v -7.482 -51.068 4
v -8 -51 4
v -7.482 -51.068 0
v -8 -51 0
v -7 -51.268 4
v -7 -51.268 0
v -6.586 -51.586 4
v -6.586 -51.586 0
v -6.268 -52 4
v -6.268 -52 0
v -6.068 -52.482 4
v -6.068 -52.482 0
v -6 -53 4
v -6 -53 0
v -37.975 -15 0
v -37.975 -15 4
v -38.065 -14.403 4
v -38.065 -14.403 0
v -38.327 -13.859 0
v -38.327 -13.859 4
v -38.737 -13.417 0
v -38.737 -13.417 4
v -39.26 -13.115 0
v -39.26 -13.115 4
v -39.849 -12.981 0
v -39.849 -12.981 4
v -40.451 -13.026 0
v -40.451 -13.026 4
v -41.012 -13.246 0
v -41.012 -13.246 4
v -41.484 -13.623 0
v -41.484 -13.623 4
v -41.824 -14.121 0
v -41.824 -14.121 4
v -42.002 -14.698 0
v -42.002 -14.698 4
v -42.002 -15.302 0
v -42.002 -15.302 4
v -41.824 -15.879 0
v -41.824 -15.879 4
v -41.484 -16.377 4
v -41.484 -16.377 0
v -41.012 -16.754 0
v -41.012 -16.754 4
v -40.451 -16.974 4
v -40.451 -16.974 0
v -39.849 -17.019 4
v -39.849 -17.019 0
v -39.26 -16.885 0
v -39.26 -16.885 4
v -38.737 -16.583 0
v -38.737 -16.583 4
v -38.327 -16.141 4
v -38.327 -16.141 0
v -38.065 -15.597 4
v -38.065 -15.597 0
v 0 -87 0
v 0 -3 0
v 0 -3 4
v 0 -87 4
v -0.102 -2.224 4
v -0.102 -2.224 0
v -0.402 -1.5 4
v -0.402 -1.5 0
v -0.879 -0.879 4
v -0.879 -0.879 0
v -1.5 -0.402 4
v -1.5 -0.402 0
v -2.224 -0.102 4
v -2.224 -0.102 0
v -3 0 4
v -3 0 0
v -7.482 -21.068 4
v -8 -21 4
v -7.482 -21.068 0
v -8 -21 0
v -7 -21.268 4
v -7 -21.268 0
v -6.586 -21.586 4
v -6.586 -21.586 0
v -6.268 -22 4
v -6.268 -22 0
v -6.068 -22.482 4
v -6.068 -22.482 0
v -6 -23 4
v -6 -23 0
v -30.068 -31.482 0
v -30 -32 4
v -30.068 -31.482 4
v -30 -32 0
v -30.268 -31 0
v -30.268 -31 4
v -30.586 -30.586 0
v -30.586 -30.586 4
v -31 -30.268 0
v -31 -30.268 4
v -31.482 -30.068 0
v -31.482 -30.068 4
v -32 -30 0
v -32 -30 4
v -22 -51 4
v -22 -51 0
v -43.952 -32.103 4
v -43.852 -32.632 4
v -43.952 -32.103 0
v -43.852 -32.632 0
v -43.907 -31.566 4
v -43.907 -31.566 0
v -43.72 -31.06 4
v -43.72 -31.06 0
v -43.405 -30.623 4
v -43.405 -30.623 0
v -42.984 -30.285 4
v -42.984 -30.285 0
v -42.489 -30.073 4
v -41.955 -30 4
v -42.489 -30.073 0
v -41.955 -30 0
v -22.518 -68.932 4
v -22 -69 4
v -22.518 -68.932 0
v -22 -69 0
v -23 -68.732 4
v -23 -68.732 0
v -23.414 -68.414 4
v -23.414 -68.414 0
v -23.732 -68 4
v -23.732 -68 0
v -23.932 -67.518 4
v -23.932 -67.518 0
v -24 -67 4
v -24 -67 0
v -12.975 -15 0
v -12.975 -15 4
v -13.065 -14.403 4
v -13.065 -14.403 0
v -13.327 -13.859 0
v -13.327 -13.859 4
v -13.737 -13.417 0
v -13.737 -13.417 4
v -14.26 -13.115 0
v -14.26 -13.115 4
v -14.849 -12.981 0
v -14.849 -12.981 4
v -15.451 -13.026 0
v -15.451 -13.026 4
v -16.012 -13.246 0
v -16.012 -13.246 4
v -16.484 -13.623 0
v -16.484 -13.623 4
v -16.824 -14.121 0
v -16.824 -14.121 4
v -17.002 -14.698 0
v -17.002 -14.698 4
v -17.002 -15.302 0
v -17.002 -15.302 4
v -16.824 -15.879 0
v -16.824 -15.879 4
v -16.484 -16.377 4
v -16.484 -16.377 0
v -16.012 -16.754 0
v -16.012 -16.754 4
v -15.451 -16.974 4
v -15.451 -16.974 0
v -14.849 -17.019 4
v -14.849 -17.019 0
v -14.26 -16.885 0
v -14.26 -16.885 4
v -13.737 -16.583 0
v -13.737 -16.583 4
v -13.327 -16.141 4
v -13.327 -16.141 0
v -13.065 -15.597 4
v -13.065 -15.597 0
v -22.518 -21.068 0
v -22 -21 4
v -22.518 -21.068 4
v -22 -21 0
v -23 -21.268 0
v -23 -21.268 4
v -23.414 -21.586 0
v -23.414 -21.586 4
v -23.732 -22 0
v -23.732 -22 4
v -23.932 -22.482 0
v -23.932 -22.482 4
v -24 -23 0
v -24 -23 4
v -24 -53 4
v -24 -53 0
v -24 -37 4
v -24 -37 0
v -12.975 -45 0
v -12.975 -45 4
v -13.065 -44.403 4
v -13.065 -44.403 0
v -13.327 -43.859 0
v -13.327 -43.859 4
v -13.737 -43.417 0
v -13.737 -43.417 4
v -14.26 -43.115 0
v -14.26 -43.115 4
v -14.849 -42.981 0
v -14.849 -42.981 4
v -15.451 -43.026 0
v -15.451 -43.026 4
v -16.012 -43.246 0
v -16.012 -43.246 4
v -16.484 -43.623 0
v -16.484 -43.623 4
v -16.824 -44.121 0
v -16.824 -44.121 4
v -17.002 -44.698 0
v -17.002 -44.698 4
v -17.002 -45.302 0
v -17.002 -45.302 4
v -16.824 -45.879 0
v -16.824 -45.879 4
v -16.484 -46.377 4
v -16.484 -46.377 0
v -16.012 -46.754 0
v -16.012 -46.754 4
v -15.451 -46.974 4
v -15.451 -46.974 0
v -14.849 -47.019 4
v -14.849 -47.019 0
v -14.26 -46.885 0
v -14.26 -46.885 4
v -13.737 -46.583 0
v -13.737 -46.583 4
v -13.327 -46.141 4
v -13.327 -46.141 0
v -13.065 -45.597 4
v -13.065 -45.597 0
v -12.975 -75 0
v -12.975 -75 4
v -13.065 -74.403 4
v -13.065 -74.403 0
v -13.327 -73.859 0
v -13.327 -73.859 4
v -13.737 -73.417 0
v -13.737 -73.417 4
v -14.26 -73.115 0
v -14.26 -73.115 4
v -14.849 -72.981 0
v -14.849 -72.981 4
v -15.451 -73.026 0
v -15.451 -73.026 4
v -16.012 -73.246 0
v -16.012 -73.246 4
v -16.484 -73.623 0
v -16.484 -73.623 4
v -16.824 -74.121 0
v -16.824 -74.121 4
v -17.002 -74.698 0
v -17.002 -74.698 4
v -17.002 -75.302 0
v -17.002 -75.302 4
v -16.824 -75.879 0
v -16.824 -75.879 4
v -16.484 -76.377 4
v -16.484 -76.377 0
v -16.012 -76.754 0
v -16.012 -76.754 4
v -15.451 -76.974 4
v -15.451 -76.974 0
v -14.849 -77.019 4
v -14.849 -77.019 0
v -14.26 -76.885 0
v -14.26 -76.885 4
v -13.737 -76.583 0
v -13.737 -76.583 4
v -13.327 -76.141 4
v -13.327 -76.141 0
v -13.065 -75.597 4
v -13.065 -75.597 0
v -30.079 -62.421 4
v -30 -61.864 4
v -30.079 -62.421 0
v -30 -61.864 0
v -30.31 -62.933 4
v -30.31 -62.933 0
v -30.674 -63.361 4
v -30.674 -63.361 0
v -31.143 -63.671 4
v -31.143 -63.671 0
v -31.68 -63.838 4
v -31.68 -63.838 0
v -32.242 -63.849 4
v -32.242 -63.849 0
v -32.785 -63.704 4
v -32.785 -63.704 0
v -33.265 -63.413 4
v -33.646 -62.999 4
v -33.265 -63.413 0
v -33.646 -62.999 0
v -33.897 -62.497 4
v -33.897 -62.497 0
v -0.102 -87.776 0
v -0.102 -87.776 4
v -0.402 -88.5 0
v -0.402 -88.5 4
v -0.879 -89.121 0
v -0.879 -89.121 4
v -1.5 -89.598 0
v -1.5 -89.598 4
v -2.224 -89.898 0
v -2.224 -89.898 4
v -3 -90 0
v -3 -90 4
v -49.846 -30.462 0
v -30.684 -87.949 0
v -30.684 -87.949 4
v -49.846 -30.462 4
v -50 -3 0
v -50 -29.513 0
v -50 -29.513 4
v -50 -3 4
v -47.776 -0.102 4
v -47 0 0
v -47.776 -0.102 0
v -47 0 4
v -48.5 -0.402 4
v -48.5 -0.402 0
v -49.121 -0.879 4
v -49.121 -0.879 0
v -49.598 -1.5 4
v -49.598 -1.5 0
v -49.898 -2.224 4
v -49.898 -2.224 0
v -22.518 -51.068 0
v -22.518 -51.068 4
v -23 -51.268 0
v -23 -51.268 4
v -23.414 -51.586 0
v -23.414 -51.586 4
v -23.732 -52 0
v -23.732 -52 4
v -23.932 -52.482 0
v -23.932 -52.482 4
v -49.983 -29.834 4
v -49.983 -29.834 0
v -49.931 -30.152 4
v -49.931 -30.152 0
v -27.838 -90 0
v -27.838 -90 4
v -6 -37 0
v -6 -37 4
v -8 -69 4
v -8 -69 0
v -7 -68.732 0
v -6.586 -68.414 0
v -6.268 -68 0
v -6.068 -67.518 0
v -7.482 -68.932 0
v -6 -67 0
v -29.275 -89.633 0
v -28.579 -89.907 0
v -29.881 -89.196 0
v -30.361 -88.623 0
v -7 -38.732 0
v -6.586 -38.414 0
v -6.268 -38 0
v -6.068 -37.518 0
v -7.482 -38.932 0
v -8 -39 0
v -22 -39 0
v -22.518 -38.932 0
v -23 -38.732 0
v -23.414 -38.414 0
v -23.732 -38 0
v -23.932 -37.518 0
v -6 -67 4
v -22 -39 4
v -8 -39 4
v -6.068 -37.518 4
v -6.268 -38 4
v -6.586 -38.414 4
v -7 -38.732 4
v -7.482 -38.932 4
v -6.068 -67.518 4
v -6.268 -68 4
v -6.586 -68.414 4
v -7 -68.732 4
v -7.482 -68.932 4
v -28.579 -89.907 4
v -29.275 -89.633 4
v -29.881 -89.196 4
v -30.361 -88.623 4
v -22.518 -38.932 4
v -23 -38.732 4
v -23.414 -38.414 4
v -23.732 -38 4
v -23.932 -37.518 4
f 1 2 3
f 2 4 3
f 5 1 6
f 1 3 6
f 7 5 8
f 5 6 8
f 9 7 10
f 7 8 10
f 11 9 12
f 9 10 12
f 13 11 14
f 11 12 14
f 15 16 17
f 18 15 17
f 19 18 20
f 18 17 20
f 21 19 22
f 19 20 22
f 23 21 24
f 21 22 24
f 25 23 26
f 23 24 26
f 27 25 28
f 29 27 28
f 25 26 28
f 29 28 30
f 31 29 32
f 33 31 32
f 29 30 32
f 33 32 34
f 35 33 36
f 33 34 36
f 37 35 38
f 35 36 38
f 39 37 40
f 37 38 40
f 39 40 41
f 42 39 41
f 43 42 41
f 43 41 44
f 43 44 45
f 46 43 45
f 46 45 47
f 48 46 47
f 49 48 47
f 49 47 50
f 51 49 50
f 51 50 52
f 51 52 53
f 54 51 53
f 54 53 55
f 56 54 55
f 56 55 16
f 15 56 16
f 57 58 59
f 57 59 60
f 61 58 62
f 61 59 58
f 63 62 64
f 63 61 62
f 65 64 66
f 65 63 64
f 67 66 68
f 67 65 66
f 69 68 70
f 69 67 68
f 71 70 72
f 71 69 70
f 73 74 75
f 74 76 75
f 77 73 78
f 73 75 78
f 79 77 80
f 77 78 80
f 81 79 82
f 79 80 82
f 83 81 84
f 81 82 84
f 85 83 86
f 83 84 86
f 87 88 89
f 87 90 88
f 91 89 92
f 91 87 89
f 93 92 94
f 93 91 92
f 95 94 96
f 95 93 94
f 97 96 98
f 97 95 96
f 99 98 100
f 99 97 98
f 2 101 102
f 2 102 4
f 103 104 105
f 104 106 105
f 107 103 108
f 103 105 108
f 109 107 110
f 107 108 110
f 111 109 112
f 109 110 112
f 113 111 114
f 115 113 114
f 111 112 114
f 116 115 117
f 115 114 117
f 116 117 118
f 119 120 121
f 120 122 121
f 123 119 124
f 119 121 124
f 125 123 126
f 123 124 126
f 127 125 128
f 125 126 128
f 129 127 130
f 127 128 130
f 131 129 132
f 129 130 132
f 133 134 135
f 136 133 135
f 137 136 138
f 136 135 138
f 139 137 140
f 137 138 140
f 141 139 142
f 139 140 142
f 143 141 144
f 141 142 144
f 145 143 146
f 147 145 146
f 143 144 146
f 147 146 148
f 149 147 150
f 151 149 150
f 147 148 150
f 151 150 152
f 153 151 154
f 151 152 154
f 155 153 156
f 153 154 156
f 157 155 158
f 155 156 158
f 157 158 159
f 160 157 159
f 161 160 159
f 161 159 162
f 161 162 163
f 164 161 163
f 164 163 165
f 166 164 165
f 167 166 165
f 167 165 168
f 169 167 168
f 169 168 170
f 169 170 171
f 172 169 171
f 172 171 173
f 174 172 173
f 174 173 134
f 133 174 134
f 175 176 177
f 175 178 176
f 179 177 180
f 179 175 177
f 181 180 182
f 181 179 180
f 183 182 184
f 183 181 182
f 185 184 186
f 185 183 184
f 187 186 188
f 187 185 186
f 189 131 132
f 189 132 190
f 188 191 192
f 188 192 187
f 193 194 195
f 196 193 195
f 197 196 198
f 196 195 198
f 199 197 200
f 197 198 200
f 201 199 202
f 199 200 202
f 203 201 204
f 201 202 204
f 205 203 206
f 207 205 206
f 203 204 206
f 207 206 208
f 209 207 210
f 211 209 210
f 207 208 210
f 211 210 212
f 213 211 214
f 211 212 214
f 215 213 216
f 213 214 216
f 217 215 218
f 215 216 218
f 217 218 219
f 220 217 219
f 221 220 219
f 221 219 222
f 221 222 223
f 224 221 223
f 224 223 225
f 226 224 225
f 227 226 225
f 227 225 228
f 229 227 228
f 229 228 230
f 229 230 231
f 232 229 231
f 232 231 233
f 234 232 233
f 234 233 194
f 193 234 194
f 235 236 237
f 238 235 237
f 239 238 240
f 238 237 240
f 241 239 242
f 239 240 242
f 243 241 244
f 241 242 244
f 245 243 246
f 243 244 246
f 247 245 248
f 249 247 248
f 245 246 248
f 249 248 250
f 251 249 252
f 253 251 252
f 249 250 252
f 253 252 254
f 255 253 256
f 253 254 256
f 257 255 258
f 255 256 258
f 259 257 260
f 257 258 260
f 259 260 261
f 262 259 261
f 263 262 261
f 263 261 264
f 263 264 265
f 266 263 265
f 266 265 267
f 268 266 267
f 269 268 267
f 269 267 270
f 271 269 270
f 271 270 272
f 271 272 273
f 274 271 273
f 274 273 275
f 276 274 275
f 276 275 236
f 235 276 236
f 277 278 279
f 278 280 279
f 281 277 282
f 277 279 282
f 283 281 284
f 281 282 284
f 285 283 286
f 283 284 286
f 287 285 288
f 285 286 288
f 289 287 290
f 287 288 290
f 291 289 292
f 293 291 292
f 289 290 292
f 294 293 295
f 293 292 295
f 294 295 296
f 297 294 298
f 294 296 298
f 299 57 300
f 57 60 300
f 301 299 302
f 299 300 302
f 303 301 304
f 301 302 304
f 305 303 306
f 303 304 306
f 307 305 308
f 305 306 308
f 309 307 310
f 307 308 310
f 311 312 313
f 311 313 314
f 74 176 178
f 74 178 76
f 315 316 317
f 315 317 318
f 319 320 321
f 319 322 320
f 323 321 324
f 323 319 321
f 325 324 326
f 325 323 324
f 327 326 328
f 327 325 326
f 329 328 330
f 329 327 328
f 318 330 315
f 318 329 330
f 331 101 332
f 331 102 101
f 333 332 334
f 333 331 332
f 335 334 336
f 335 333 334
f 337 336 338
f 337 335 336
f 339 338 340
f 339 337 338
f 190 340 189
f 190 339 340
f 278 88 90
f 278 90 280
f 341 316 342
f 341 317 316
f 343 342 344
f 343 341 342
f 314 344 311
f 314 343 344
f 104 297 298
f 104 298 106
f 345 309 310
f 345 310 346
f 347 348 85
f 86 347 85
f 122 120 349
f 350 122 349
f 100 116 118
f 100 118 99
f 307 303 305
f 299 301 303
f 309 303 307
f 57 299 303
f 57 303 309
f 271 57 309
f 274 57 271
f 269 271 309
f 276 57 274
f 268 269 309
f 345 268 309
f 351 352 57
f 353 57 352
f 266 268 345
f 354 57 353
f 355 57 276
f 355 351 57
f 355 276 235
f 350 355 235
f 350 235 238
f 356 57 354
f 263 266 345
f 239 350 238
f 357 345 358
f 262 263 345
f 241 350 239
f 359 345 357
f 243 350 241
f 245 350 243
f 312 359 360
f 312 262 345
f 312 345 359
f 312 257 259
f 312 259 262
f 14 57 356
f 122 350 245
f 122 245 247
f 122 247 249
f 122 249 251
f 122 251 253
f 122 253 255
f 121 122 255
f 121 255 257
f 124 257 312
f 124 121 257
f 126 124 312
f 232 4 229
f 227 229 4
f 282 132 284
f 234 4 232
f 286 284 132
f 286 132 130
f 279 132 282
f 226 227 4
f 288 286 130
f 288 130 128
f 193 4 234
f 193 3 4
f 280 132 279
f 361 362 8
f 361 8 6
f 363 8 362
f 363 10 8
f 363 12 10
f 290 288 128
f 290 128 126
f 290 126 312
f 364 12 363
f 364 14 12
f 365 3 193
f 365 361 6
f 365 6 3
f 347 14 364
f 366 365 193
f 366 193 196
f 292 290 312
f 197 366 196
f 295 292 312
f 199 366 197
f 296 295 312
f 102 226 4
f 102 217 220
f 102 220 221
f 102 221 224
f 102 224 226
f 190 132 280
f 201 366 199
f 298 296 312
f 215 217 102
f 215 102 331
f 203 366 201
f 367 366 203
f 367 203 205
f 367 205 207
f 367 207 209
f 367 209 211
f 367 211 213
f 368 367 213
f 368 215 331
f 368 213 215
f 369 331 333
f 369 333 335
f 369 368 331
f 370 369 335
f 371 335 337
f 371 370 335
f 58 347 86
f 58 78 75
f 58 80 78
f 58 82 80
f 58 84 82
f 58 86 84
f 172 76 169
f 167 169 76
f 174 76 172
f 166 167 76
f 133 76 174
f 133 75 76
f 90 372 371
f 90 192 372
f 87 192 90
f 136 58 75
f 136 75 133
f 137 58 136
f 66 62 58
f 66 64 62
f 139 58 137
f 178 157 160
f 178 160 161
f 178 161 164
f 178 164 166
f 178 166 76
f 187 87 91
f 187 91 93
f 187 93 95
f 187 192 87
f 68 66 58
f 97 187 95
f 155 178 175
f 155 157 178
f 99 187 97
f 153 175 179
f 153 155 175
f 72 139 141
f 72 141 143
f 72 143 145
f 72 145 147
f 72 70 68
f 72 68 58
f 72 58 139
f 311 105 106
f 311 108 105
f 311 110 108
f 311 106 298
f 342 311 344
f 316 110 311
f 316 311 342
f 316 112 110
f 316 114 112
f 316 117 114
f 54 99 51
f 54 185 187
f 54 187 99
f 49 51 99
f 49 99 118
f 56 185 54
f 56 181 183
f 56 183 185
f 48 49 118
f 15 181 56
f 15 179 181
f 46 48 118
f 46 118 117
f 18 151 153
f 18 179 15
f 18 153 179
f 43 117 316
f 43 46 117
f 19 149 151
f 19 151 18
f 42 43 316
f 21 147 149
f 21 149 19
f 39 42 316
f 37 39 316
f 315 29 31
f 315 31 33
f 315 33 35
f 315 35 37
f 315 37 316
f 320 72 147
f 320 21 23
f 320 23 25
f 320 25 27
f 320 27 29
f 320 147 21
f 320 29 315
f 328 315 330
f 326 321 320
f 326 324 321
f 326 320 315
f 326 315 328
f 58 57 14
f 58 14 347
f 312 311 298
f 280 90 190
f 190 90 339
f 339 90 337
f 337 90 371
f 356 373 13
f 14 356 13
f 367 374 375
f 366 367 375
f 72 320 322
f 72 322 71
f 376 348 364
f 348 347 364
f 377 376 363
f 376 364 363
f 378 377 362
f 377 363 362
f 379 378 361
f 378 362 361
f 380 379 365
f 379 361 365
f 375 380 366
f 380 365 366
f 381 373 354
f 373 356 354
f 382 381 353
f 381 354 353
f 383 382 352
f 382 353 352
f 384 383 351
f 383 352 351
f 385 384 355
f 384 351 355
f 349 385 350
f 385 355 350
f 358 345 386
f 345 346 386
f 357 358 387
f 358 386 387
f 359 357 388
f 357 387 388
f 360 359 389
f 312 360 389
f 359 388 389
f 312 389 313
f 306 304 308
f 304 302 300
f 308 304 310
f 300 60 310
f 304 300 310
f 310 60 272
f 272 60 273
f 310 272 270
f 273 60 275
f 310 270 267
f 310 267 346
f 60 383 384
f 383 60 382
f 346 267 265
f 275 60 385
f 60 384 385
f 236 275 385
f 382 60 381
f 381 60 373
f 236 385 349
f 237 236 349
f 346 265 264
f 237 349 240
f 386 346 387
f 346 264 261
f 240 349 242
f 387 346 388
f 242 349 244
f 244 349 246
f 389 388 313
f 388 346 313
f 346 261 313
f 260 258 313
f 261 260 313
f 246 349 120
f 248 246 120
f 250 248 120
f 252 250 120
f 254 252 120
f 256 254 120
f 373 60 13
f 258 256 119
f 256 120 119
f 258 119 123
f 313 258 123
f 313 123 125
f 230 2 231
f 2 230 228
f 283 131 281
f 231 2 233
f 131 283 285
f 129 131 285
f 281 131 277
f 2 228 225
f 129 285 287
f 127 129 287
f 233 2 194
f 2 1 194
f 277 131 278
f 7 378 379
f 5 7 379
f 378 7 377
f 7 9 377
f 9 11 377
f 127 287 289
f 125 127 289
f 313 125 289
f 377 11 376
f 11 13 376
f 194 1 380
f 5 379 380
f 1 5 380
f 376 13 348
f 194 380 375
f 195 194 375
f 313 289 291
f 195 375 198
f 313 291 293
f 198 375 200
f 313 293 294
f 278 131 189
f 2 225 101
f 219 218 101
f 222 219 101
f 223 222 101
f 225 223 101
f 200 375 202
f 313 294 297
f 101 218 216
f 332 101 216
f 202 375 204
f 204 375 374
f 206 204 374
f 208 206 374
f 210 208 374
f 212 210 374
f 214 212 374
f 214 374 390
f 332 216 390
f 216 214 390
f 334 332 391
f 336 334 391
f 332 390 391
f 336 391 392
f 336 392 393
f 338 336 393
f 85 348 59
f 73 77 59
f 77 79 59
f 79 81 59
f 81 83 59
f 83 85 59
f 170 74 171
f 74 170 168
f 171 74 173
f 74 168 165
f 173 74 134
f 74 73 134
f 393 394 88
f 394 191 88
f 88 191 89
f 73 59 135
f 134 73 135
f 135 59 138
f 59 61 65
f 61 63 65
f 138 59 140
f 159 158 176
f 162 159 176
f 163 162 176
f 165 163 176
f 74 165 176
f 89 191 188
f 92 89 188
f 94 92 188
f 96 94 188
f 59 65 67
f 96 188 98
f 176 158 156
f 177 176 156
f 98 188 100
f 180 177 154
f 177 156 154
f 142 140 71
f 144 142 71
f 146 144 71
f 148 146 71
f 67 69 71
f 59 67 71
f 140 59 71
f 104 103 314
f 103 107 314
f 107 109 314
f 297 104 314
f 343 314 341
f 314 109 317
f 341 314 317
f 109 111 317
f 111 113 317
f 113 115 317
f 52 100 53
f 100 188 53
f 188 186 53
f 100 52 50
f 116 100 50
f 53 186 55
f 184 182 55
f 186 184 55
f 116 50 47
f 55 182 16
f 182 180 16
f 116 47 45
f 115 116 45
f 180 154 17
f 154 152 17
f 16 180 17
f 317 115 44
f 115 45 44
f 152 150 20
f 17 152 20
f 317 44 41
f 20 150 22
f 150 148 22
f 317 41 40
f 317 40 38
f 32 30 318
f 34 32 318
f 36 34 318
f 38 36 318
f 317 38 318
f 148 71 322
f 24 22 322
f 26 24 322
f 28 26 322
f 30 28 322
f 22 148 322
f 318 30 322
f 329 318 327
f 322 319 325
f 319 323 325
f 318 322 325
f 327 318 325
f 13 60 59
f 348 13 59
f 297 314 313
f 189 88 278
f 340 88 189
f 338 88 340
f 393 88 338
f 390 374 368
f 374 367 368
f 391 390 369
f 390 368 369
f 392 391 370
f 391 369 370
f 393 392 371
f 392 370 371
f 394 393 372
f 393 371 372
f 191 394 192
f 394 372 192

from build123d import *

# Parameters (mm, degrees)
EXTRUDE_1_DEPTH     = 4
SKETCH_2_R          = 2.025
CUT_EXTRUDE_1_DEPTH = 5
SKETCH_3_W          = 18
SKETCH_3_H          = 18
CUT_EXTRUDE_2_DEPTH = 5
FILLET_1_R          = 2
FILLET_2_R          = 3


with BuildPart() as part:
    # 草图1 → 凸台-拉伸1 (new body)
    with BuildSketch(Plane.XY):
        Polygon((0, 0), (0, -90), (-30, -90), (-50, -30), (-50, 0), align=None)
    extrude(amount=EXTRUDE_1_DEPTH)

    # 草图2 → 切除-拉伸1 (cut, through all)
    with BuildSketch(Plane.XY.offset(4)):
        with Locations((-15, -75)):
            Circle(SKETCH_2_R)
        with Locations((-15, -45)):
            Circle(SKETCH_2_R)
        with Locations((-15, -15)):
            Circle(SKETCH_2_R)
        with Locations((-40, -15)):
            Circle(SKETCH_2_R)
    extrude(amount=-CUT_EXTRUDE_1_DEPTH, mode=Mode.SUBTRACT)

    # 草图3 → 切除-拉伸2 (cut, through all)
    with BuildSketch(Plane.XY.offset(4)):
        Polygon((-44.729537233, -30), (-30, -30), (-30, -74.188611699), align=None)
        with Locations((-15, -30)):
            Rectangle(SKETCH_3_W, SKETCH_3_H)
        with Locations((-15, -60)):
            Rectangle(SKETCH_3_W, SKETCH_3_H)
    extrude(amount=-CUT_EXTRUDE_2_DEPTH, mode=Mode.SUBTRACT)

    # 圆角1
    fillet_1_edges = [part.edges().sort_by_distance(p)[0] for p in [
        (-30, -74.188611699, 2),
        (-44.729537233, -30, 2),
        (-30, -30, 2),
        (-6, -51, 2),
        (-6, -69, 2),
        (-24, -69, 2),
        (-24, -51, 2),
        (-6, -21, 2),
        (-6, -39, 2),
        (-24, -39, 2),
        (-24, -21, 2),
    ]]
    fillet(fillet_1_edges, radius=FILLET_1_R)

    # 圆角2
    fillet_2_edges = [part.edges().sort_by_distance(p)[0] for p in [
        (0, 0, 2),
        (0, -90, 2),
        (-30, -90, 2),
        (-50, -30, 2),
        (-50, 0, 2),
    ]]
    fillet(fillet_2_edges, radius=FILLET_2_R)


solid = part.part
